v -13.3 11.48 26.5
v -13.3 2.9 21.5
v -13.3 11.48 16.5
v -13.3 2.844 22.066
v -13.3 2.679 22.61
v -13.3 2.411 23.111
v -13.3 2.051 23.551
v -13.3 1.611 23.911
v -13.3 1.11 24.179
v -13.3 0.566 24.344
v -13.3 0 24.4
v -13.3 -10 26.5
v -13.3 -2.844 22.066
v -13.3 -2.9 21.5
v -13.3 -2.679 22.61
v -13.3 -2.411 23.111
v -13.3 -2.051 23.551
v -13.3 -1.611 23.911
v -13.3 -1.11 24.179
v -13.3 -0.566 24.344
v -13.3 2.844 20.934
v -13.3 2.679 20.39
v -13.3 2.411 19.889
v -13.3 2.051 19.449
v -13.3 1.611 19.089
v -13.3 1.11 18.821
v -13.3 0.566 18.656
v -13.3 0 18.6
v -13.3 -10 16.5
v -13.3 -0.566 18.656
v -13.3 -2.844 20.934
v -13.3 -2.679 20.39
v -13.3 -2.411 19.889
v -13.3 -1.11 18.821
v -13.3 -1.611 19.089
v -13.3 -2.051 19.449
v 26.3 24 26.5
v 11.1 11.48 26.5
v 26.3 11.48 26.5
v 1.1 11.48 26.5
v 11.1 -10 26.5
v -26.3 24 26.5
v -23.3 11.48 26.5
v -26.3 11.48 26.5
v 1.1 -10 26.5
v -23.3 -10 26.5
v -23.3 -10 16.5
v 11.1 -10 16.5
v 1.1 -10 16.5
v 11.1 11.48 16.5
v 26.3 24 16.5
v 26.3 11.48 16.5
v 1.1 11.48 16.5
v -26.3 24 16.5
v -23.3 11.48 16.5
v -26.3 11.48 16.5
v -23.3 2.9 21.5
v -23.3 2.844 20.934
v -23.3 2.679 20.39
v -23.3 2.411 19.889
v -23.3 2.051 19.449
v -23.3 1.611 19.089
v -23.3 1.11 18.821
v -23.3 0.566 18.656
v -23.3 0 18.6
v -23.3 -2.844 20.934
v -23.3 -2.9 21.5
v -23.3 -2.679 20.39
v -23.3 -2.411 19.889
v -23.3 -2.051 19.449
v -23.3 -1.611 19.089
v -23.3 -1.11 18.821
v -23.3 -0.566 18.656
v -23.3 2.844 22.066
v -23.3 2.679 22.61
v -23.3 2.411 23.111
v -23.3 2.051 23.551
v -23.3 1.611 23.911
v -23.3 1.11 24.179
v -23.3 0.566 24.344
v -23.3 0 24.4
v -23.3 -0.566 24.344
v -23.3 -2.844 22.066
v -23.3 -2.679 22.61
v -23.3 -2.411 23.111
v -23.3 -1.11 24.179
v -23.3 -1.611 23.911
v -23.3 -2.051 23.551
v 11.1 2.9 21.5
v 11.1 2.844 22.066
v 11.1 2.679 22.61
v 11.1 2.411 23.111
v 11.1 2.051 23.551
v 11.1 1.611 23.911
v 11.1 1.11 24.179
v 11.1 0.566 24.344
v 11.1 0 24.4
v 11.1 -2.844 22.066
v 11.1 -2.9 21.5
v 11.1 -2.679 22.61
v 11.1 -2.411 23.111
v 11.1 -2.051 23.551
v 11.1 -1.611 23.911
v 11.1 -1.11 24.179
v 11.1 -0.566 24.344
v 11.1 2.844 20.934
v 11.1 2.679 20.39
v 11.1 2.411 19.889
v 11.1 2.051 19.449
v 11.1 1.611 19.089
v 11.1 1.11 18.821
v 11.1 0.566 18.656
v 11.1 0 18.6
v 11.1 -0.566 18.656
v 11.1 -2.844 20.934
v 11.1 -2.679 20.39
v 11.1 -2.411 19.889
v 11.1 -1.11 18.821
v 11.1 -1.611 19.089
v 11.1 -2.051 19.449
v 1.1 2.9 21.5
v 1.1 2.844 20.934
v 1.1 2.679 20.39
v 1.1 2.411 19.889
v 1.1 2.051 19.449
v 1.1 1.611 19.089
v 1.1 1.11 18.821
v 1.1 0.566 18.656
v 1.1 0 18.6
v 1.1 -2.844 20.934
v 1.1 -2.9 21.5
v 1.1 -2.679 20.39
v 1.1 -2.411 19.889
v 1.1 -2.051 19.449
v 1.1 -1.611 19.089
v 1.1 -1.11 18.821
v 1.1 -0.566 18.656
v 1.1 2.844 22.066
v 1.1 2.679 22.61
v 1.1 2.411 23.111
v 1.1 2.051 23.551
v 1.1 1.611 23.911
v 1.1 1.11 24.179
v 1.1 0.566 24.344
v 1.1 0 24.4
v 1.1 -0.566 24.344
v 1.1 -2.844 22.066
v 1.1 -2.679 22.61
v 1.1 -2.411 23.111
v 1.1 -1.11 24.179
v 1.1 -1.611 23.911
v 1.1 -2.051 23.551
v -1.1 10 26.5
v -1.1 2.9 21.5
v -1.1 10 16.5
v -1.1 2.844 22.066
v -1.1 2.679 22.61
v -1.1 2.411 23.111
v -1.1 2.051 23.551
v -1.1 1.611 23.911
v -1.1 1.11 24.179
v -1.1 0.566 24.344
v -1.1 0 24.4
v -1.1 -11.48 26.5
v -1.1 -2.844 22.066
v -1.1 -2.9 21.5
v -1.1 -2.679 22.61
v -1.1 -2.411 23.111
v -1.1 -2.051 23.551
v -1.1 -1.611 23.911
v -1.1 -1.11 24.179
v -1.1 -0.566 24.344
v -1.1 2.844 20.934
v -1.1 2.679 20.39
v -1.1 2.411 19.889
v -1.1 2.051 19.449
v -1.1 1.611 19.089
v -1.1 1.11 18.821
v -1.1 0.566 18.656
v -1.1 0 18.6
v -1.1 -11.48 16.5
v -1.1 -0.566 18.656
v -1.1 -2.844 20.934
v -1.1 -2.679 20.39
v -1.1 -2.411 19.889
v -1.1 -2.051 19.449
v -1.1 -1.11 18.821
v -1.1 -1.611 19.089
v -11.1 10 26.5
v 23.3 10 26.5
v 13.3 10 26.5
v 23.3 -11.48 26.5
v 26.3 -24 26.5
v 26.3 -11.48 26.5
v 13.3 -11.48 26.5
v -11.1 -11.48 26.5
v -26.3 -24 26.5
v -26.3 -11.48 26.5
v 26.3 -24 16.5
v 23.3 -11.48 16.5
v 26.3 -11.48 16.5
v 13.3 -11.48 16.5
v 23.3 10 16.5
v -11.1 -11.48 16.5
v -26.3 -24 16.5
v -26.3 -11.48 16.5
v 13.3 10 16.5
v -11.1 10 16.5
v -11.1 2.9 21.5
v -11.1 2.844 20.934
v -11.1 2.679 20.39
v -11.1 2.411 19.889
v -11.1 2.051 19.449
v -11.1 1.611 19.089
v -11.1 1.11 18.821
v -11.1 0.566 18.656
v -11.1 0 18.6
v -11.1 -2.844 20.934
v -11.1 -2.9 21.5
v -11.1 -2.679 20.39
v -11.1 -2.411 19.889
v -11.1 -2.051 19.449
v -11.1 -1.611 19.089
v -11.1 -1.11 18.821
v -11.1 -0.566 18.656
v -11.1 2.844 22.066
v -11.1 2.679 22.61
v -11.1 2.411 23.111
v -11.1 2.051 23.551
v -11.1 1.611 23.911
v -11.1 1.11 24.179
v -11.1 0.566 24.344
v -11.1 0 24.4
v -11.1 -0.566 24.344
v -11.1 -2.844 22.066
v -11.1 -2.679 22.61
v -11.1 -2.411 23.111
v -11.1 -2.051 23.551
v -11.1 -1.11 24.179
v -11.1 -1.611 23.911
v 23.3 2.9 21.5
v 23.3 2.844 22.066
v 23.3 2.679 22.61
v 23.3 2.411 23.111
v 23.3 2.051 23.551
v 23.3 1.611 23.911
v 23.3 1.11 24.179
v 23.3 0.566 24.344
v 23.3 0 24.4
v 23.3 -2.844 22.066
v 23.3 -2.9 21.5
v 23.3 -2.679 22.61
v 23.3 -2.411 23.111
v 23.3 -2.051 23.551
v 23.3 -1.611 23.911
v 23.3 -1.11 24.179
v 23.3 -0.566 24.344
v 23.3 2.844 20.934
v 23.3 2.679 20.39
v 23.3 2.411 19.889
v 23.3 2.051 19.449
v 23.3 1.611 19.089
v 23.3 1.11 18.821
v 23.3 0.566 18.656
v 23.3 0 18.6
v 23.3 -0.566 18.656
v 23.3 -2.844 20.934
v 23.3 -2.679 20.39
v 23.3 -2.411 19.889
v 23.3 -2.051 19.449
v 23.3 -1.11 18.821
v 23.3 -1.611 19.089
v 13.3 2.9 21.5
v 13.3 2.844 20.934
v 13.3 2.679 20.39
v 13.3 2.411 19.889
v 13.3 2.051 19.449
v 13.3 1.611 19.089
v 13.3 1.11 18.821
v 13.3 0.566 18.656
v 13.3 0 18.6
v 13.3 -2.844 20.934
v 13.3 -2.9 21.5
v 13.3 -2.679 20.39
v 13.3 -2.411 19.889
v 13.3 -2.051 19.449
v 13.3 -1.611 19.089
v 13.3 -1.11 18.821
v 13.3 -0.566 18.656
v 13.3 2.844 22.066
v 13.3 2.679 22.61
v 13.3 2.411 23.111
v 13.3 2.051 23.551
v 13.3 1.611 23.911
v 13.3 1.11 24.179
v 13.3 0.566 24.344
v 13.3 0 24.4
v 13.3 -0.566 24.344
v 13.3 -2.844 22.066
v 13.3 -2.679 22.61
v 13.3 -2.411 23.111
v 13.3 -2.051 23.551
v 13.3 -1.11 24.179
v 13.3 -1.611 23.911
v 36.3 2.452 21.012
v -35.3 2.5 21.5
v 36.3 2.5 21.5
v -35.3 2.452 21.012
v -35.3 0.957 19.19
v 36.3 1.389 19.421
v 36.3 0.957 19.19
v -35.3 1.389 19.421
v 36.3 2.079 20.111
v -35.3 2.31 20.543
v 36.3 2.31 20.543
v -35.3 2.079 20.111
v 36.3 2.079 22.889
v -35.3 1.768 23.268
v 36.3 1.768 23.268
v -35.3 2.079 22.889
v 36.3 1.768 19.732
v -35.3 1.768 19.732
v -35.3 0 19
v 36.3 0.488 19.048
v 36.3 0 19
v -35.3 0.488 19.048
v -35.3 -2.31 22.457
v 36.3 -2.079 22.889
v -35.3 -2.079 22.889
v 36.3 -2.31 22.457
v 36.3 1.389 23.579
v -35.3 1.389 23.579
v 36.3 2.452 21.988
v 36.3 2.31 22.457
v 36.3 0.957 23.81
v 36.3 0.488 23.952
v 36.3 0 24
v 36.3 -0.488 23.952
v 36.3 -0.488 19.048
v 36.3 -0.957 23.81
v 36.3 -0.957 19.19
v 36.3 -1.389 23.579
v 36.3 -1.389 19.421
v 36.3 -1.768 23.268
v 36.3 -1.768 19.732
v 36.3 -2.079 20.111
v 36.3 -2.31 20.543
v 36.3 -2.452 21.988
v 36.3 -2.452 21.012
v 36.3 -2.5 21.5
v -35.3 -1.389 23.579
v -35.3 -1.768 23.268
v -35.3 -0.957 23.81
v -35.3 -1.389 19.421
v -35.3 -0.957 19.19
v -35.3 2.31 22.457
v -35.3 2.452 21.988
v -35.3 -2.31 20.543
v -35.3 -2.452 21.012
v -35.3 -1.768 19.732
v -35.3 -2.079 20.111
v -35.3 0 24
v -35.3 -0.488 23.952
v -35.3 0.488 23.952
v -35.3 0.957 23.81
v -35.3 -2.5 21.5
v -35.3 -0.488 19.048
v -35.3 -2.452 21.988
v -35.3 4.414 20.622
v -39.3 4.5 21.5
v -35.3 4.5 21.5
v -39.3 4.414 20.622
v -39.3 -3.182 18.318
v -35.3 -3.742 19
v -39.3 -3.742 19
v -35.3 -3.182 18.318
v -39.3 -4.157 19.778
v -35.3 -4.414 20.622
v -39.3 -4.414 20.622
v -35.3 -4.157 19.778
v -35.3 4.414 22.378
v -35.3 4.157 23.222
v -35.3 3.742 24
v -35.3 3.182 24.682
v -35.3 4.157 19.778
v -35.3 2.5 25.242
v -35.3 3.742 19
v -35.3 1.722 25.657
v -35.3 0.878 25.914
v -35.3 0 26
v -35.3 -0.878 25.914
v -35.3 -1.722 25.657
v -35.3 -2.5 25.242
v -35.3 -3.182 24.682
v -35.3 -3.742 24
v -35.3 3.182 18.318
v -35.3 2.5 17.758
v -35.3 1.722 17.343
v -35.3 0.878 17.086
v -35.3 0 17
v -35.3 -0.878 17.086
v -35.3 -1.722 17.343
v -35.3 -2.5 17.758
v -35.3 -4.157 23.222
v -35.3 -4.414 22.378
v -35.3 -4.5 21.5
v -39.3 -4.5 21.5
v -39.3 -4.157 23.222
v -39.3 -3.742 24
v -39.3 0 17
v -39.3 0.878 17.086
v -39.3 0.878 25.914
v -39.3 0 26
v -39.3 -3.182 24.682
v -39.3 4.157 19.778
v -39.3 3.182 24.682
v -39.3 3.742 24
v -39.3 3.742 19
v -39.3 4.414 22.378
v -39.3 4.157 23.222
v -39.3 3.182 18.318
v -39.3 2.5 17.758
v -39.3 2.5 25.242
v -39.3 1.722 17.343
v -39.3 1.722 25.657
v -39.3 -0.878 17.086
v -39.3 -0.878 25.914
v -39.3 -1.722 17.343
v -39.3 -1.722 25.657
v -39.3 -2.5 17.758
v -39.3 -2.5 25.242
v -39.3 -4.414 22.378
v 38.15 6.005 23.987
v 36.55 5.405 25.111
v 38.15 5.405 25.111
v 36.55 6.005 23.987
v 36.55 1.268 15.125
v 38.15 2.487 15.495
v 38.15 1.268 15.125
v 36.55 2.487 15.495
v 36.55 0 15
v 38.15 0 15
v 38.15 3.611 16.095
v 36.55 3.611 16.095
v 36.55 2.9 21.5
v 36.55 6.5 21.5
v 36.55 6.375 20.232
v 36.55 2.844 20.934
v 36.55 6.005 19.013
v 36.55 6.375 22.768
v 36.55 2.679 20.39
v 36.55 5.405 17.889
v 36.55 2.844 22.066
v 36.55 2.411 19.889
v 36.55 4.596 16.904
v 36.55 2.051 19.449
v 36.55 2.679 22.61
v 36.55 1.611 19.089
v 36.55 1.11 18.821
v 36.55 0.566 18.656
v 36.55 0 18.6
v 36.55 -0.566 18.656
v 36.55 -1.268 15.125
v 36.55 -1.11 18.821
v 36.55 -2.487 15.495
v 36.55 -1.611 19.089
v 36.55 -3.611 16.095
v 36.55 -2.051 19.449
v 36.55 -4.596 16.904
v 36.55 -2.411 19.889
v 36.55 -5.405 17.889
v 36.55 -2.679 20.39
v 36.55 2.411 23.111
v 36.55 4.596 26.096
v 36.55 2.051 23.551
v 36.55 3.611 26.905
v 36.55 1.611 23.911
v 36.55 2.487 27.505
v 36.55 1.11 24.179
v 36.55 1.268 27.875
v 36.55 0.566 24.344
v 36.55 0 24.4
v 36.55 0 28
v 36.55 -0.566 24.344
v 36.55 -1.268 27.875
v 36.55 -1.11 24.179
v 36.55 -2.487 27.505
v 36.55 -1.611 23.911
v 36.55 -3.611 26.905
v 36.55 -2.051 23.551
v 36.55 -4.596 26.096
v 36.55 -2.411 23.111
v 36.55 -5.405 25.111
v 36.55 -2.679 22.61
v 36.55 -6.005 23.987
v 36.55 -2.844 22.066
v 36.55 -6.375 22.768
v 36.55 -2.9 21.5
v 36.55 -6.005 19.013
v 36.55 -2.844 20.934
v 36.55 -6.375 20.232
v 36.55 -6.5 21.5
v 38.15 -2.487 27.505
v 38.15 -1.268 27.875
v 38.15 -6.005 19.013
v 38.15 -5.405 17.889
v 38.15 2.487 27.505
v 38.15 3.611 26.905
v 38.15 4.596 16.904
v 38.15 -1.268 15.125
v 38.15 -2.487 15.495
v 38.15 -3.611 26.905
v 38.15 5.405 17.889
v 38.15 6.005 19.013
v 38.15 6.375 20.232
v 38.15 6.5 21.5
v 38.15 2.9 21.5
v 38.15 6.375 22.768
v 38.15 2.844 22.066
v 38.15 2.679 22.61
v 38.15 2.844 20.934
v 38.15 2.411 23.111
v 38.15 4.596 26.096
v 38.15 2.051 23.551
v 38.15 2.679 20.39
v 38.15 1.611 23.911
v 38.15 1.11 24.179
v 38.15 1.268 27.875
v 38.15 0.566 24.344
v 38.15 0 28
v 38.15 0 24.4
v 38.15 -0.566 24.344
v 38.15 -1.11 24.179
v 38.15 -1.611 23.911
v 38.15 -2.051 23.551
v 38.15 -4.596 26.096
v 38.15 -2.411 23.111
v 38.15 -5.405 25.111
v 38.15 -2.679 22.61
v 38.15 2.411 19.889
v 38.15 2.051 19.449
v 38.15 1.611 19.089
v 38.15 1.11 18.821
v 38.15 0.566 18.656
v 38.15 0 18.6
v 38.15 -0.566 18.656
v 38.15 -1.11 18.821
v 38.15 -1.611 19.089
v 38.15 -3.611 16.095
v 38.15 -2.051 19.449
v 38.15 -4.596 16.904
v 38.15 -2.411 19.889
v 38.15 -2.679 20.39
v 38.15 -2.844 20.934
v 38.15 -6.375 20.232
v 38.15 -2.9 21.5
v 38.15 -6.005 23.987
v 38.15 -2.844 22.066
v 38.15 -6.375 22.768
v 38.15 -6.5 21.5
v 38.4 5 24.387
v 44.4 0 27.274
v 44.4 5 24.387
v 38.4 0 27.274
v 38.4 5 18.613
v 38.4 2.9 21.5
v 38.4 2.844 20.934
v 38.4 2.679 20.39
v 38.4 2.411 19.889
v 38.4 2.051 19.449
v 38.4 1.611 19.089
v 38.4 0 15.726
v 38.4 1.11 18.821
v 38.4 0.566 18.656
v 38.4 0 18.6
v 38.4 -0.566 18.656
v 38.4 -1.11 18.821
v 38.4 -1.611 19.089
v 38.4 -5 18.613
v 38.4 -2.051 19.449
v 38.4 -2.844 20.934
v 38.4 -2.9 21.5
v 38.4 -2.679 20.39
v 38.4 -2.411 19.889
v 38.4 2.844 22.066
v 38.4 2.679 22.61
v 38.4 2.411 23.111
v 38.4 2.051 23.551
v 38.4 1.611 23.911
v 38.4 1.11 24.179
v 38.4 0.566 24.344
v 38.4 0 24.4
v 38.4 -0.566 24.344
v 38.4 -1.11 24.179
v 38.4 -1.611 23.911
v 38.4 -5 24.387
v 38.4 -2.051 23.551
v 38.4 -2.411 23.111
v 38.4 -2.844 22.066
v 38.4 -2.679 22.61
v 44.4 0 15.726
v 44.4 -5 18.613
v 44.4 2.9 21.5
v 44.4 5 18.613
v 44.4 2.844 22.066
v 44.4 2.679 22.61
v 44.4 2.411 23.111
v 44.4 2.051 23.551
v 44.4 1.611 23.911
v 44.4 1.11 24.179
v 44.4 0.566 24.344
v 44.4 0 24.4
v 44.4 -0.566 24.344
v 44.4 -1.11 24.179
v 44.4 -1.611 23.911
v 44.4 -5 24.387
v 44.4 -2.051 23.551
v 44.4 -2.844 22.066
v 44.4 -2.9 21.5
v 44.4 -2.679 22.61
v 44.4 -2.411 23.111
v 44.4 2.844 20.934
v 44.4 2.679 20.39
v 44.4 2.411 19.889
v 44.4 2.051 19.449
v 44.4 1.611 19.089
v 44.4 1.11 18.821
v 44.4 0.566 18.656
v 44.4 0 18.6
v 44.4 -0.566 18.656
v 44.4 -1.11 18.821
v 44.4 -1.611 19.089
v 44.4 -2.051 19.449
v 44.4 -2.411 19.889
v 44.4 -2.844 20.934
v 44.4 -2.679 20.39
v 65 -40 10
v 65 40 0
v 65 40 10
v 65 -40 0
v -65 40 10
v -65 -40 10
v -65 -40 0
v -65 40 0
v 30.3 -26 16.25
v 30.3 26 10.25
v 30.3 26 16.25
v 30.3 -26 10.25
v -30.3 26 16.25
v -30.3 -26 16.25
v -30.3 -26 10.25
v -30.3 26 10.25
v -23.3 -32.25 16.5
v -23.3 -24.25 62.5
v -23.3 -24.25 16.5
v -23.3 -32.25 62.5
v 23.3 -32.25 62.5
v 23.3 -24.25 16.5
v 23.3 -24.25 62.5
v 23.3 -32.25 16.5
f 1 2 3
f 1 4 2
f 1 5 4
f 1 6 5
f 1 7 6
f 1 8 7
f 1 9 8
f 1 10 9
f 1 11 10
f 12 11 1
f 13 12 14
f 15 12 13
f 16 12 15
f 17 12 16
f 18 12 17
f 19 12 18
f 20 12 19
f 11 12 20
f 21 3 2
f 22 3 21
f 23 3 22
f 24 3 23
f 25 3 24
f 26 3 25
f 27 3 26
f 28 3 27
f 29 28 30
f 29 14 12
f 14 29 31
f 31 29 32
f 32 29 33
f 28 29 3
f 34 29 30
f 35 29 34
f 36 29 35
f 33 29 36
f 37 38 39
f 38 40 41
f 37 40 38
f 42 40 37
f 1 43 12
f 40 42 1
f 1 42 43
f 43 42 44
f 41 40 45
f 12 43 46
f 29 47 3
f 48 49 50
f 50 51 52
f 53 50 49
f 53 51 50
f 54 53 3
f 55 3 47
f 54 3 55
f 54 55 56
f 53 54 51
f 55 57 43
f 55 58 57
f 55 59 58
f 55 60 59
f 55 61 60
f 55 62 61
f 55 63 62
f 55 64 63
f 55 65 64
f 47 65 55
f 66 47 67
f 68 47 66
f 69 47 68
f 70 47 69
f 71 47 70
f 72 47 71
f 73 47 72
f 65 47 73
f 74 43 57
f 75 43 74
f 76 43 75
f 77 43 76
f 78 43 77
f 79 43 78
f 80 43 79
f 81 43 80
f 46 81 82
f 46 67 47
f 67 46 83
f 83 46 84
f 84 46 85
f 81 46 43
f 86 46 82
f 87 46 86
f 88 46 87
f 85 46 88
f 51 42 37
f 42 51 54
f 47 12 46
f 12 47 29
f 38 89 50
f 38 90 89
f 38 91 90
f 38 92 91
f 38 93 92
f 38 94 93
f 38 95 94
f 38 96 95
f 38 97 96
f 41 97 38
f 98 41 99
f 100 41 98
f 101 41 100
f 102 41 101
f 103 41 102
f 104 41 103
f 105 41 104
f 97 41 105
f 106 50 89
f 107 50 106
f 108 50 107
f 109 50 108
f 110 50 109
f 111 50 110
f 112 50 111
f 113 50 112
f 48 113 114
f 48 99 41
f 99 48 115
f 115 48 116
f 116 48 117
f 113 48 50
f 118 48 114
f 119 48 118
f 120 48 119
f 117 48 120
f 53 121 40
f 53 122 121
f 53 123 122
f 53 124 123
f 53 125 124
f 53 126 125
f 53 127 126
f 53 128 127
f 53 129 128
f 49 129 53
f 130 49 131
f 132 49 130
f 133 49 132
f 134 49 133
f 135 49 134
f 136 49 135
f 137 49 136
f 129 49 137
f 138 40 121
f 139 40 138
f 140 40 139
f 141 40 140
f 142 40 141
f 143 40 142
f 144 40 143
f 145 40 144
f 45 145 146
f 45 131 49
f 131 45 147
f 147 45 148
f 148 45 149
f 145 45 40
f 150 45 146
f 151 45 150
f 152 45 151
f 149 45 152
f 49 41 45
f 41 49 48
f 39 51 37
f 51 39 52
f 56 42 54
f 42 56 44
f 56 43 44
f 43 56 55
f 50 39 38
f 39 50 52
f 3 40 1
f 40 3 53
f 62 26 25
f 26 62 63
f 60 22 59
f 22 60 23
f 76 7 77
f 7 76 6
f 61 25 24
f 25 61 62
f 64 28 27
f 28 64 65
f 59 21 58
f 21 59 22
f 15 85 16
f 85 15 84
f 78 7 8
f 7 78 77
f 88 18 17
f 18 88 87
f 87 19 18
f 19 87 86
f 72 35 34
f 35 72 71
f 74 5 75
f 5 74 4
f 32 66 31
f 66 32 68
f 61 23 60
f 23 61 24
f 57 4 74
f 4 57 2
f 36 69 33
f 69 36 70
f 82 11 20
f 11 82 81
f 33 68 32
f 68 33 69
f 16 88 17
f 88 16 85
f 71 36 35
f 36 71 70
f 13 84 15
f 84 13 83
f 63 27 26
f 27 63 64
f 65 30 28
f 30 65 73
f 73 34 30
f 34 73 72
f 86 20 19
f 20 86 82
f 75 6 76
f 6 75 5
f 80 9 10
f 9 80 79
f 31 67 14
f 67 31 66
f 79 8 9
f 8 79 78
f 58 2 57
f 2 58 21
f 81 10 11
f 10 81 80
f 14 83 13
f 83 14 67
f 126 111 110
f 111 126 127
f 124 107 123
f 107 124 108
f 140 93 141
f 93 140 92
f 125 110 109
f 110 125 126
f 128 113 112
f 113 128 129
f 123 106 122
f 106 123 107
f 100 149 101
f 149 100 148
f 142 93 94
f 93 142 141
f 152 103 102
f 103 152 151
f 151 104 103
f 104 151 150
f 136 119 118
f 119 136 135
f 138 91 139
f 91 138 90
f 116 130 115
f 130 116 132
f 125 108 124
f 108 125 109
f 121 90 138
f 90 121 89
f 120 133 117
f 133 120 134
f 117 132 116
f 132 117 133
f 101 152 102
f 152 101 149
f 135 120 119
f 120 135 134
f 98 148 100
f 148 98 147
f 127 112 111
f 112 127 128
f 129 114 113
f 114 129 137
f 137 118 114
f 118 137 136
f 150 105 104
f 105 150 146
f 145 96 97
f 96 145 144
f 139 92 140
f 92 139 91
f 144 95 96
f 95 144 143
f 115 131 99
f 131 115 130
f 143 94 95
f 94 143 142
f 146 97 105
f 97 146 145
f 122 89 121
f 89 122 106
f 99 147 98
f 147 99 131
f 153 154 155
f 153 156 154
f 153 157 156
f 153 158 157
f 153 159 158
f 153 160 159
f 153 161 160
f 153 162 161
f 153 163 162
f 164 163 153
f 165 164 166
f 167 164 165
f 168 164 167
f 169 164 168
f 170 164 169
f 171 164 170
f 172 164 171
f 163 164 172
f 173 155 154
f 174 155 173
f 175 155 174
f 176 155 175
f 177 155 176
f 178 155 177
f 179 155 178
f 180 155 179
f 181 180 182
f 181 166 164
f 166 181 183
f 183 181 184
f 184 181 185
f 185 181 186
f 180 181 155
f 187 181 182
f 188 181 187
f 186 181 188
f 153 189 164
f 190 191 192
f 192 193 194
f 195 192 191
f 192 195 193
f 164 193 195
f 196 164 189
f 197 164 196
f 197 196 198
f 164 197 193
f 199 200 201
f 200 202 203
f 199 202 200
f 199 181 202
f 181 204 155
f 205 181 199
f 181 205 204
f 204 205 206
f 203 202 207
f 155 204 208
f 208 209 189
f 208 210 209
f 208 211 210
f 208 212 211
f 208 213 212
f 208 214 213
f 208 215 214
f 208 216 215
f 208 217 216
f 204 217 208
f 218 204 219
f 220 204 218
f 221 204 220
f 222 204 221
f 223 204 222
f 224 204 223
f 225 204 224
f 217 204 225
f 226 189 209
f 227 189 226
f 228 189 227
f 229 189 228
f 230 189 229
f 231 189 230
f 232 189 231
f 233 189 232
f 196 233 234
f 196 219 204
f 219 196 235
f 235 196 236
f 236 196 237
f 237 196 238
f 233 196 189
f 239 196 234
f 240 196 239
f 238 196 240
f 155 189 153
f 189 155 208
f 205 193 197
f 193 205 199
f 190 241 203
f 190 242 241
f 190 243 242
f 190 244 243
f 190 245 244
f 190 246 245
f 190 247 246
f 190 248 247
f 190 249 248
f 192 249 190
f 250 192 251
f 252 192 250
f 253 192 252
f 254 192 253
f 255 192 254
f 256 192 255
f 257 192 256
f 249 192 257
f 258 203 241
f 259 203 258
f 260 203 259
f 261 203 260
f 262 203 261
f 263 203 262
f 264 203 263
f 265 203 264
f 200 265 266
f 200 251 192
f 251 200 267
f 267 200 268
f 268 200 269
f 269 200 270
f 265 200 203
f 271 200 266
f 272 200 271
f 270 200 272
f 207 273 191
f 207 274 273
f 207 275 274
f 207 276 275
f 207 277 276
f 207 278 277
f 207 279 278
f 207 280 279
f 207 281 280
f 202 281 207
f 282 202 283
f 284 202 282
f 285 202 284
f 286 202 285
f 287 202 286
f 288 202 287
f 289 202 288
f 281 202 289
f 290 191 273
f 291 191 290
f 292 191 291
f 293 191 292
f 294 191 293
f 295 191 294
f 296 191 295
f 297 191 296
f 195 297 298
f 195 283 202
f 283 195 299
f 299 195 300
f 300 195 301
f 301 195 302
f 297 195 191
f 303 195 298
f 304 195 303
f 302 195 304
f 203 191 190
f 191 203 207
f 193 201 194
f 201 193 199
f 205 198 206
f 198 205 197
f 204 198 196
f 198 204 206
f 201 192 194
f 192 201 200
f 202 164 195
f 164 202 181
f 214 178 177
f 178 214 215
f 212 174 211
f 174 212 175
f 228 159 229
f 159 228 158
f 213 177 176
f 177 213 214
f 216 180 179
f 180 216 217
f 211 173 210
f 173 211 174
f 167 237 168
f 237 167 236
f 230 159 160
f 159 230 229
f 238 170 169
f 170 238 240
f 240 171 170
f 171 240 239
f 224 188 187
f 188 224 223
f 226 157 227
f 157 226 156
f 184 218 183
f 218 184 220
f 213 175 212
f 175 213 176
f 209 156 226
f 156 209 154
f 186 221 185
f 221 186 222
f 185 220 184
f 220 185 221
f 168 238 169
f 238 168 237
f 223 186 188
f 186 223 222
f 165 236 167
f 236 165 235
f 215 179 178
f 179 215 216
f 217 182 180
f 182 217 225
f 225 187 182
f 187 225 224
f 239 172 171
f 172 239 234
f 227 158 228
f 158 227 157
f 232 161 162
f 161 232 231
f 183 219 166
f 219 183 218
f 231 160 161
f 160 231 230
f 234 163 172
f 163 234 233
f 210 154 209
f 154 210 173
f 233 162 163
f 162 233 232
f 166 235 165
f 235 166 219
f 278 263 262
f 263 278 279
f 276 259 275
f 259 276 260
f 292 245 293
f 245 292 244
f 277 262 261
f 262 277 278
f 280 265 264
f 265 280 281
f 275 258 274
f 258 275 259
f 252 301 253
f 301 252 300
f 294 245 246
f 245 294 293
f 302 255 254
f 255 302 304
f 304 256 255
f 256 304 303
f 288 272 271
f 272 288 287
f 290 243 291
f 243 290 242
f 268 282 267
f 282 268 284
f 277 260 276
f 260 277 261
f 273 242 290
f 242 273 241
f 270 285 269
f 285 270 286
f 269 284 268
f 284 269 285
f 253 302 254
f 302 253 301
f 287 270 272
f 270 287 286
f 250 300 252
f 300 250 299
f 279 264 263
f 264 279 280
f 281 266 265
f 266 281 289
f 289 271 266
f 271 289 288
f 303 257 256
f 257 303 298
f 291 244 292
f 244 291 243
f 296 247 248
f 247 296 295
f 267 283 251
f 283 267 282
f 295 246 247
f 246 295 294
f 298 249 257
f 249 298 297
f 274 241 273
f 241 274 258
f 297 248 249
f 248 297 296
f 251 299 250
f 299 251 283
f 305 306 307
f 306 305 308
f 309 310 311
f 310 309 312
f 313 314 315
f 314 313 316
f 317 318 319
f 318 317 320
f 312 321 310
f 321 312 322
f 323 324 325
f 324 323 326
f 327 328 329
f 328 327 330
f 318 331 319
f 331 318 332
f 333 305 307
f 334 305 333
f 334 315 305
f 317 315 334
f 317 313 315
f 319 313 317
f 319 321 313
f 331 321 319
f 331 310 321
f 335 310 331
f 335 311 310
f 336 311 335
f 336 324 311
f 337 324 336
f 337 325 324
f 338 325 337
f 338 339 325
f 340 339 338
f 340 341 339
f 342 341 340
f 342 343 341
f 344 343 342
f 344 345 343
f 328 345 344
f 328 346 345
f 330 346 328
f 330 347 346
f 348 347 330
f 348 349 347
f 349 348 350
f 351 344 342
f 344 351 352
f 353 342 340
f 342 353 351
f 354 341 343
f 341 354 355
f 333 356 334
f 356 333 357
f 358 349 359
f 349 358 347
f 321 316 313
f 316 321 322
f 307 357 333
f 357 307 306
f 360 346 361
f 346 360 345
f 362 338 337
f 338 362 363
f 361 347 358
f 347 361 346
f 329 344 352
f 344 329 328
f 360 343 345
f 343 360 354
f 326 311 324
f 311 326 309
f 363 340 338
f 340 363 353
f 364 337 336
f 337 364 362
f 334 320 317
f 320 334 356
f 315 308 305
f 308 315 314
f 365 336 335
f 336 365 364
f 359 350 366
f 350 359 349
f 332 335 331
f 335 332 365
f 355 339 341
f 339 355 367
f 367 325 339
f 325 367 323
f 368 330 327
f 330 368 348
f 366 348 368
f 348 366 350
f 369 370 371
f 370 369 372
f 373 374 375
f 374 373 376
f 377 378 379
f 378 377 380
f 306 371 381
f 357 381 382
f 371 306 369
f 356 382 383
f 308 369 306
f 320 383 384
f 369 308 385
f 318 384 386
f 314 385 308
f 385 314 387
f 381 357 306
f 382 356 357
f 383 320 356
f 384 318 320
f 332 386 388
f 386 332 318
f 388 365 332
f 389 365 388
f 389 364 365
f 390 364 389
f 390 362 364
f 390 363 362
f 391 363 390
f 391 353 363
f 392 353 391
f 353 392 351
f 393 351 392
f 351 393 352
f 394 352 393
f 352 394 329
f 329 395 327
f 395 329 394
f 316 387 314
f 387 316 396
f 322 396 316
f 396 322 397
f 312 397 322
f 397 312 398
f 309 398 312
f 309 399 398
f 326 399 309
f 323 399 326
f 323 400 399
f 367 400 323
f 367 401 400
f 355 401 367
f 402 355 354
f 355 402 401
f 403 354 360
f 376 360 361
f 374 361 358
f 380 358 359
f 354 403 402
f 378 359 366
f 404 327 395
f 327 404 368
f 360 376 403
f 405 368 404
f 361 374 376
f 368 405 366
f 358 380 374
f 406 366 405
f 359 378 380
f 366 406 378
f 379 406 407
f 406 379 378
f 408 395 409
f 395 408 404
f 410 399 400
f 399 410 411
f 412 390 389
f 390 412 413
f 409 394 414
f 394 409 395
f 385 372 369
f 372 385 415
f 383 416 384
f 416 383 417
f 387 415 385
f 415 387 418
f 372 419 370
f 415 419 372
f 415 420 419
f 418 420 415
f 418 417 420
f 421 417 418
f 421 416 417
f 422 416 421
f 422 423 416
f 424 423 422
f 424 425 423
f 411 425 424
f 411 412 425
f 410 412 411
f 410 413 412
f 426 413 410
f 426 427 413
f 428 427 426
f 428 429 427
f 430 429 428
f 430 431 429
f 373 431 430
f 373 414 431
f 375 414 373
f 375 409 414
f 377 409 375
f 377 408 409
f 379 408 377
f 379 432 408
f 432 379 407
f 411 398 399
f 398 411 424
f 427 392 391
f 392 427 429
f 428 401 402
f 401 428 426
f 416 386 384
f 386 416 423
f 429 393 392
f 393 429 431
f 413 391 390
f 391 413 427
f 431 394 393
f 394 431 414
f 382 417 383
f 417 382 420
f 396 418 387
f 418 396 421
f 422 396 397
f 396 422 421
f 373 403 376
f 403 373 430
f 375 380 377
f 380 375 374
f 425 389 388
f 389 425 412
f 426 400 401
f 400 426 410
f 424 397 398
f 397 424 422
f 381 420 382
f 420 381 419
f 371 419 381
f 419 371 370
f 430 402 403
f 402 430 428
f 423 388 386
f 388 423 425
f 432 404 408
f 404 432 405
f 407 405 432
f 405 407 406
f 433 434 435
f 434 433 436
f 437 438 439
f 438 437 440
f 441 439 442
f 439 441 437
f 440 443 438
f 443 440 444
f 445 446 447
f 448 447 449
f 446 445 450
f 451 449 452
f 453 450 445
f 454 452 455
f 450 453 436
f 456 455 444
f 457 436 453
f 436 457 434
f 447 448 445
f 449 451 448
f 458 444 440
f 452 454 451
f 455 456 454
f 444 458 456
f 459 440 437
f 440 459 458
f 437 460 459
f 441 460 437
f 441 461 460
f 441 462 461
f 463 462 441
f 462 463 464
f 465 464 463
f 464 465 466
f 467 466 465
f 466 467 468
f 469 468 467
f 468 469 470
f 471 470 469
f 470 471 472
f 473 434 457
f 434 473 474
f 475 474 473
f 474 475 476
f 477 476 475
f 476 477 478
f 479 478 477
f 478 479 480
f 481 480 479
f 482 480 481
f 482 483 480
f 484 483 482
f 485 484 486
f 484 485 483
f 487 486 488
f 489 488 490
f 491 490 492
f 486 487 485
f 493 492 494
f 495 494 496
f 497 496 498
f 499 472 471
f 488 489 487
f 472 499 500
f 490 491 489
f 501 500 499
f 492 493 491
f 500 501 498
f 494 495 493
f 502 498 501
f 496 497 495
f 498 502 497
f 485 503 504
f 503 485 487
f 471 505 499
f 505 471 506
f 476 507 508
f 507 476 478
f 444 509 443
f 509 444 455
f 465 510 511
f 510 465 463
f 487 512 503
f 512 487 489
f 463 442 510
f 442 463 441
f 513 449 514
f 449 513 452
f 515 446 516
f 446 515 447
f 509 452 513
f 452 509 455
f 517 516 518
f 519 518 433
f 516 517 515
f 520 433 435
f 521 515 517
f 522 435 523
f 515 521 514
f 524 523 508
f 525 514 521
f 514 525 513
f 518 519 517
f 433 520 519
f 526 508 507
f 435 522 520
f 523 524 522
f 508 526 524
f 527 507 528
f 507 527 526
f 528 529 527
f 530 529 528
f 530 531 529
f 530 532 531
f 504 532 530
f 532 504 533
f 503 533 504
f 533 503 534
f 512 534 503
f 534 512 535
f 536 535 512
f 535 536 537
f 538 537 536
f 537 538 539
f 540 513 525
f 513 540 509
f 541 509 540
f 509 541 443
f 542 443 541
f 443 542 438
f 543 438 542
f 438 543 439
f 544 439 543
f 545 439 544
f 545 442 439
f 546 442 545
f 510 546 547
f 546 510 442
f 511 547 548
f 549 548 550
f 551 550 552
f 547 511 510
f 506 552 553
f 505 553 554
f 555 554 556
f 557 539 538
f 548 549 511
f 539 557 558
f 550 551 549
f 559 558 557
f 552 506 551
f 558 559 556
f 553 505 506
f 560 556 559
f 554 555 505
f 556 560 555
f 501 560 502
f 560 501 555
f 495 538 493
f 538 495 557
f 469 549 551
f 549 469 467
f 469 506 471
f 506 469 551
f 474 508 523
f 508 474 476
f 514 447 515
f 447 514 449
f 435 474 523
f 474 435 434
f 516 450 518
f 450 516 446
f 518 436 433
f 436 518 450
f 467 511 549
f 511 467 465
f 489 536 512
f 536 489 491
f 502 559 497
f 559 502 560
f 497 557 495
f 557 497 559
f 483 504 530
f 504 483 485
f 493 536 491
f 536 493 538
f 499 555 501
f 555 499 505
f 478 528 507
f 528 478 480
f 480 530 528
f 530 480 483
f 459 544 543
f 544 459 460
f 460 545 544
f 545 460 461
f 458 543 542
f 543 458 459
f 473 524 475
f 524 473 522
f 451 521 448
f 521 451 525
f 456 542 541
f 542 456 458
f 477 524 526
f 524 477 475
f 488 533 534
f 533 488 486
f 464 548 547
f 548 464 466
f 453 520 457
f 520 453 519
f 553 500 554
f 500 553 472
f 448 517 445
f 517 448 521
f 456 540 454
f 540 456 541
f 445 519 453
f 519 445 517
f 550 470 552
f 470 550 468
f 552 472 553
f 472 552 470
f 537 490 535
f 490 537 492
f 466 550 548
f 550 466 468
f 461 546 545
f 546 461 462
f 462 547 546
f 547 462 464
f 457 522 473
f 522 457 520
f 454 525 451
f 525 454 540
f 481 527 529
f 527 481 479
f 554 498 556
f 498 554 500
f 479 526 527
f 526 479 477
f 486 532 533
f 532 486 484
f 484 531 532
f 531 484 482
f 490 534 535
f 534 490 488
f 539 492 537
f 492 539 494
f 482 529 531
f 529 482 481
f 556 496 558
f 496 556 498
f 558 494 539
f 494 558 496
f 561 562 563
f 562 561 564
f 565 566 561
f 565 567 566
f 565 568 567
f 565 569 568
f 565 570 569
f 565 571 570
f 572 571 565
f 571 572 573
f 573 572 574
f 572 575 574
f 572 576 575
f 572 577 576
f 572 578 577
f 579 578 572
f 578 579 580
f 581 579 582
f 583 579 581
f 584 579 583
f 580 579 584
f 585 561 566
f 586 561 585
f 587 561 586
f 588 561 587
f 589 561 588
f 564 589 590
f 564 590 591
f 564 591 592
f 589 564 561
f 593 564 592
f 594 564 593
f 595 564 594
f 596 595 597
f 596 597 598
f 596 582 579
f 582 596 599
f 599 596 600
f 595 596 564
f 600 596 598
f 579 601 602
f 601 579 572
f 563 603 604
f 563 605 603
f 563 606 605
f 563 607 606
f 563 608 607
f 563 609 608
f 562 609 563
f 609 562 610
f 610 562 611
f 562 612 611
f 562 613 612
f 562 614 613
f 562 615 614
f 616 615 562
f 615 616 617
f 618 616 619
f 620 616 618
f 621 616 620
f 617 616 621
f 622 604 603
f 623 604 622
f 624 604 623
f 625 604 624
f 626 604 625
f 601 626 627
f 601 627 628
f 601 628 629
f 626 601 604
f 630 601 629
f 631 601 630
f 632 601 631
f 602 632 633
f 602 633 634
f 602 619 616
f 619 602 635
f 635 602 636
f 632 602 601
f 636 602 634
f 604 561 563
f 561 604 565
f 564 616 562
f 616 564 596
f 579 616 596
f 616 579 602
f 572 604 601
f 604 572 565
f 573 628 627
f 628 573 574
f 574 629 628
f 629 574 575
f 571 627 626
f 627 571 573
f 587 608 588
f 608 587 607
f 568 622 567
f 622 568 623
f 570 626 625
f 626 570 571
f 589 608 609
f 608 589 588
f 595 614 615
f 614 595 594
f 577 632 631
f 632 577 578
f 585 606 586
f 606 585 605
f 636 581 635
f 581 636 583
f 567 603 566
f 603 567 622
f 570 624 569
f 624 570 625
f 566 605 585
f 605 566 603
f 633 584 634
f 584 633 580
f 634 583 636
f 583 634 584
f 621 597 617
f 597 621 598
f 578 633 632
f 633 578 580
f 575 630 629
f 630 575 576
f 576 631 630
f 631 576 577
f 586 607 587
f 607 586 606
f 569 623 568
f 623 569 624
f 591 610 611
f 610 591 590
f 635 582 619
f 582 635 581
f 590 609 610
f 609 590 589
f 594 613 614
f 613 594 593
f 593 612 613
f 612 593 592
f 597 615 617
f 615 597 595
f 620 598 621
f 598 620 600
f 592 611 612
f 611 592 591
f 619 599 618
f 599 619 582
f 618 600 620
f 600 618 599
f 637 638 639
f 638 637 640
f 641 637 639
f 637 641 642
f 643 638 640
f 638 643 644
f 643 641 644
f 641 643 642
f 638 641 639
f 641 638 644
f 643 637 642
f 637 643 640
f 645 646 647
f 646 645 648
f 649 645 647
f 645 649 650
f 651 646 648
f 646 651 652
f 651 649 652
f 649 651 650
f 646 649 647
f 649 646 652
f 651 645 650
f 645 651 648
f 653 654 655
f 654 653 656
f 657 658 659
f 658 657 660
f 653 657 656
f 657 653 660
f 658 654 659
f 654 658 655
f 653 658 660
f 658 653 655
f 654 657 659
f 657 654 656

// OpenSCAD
$fn = 32;

// ------------------------------------------------------------------------
// Comb hinge with flap: leaf 52.6 x 24 mm, pin d5, flap 46 mm
// Every part is its own module, assembly() places every instance.
// ------------------------------------------------------------------------

// --- part 1 ---
module hinge_bed() {
  difference() {
    translate([-65, -40, 0]) cube([130, 80, 10]);
  }
}

// --- part 2 ---
module hinge_riser() {
  difference() {
    translate([-30.3, -26, 0]) cube([60.6, 52, 6]);
  }
}

// --- part 3 ---
module hinge_leaf_a() {
  difference() {
    union() {
      translate([-23.3, -10, -5]) cube([10, 34, 10]);
      translate([1.1, -10, -5]) cube([10, 34, 10]);
      translate([-26.3, 11.48, -5]) cube([52.6, 12.52, 10]);
    }
    translate([-18.3, 0, 0]) rotate([0, 90, 0]) cylinder(h = 12, d = 5.8, center = true);
    translate([6.1, 0, 0]) rotate([0, 90, 0]) cylinder(h = 12, d = 5.8, center = true);
  }
}

// --- part 4 ---
module hinge_leaf_b() {
  difference() {
    union() {
      translate([-11.1, -24, -5]) cube([10, 34, 10]);
      translate([13.3, -24, -5]) cube([10, 34, 10]);
      translate([-26.3, -24, -5]) cube([52.6, 12.52, 10]);
    }
    translate([-6.1, 0, 0]) rotate([0, 90, 0]) cylinder(h = 12, d = 5.8, center = true);
    translate([18.3, 0, 0]) rotate([0, 90, 0]) cylinder(h = 12, d = 5.8, center = true);
  }
}

// --- part 5 ---
module hinge_flap() {
  difference() {
    translate([-23.3, -23, 0]) cube([46.6, 46, 8]);
  }
}

// --- part 6 ---
module hinge_pin() {
  rotate([0, 90, 0]) cylinder(h = 72.6, d = 5, center = true);
  translate([-39.3, 0, 0]) rotate([0, 90, 0]) cylinder(h = 4, d = 9);
}

// --- part 7 ---
module pin_washer() {
  difference() {
      translate([0, 0, 0]) cylinder(h = 1.6, d = 13);
      translate([0, 0, -1]) cylinder(h = 3.6, d = 5.8);
    }
}

// --- part 8 ---
module pin_nut() {
  difference() {
    linear_extrude(height = 6) polygon(points = [[5.774, 0], [2.887, 5], [-2.887, 5], [-5.774, 0], [-2.887, -5], [2.887, -5]]);
    translate([0, 0, -1]) cylinder(h = 8, d = 5.8);
  }
}

// --- assembly ---
module assembly() {
  color([0.80, 0.24, 0.20]) translate([0, 0, 0]) rotate([0, 0, 0]) hinge_bed();
  color([0.20, 0.45, 0.75]) translate([0, 0, 10.25]) rotate([0, 0, 0]) hinge_riser();
  color([0.25, 0.62, 0.32]) translate([0, 0, 21.5]) rotate([0, 0, 0]) hinge_leaf_a();
  color([0.92, 0.70, 0.18]) translate([0, 0, 21.5]) rotate([0, 0, 0]) hinge_leaf_b();
  color([0.58, 0.35, 0.70]) translate([0, -24.25, 39.5]) rotate([90, 0, 0]) hinge_flap();
  color([0.16, 0.66, 0.66]) translate([0, 0, 21.5]) rotate([0, 0, 0]) hinge_pin();
  color([0.85, 0.48, 0.18]) translate([36.55, 0, 21.5]) rotate([0, 90, 0]) pin_washer();
  color([0.55, 0.60, 0.65]) translate([38.4, 0, 21.5]) rotate([0, 90, 0]) pin_nut();
}

assembly();
